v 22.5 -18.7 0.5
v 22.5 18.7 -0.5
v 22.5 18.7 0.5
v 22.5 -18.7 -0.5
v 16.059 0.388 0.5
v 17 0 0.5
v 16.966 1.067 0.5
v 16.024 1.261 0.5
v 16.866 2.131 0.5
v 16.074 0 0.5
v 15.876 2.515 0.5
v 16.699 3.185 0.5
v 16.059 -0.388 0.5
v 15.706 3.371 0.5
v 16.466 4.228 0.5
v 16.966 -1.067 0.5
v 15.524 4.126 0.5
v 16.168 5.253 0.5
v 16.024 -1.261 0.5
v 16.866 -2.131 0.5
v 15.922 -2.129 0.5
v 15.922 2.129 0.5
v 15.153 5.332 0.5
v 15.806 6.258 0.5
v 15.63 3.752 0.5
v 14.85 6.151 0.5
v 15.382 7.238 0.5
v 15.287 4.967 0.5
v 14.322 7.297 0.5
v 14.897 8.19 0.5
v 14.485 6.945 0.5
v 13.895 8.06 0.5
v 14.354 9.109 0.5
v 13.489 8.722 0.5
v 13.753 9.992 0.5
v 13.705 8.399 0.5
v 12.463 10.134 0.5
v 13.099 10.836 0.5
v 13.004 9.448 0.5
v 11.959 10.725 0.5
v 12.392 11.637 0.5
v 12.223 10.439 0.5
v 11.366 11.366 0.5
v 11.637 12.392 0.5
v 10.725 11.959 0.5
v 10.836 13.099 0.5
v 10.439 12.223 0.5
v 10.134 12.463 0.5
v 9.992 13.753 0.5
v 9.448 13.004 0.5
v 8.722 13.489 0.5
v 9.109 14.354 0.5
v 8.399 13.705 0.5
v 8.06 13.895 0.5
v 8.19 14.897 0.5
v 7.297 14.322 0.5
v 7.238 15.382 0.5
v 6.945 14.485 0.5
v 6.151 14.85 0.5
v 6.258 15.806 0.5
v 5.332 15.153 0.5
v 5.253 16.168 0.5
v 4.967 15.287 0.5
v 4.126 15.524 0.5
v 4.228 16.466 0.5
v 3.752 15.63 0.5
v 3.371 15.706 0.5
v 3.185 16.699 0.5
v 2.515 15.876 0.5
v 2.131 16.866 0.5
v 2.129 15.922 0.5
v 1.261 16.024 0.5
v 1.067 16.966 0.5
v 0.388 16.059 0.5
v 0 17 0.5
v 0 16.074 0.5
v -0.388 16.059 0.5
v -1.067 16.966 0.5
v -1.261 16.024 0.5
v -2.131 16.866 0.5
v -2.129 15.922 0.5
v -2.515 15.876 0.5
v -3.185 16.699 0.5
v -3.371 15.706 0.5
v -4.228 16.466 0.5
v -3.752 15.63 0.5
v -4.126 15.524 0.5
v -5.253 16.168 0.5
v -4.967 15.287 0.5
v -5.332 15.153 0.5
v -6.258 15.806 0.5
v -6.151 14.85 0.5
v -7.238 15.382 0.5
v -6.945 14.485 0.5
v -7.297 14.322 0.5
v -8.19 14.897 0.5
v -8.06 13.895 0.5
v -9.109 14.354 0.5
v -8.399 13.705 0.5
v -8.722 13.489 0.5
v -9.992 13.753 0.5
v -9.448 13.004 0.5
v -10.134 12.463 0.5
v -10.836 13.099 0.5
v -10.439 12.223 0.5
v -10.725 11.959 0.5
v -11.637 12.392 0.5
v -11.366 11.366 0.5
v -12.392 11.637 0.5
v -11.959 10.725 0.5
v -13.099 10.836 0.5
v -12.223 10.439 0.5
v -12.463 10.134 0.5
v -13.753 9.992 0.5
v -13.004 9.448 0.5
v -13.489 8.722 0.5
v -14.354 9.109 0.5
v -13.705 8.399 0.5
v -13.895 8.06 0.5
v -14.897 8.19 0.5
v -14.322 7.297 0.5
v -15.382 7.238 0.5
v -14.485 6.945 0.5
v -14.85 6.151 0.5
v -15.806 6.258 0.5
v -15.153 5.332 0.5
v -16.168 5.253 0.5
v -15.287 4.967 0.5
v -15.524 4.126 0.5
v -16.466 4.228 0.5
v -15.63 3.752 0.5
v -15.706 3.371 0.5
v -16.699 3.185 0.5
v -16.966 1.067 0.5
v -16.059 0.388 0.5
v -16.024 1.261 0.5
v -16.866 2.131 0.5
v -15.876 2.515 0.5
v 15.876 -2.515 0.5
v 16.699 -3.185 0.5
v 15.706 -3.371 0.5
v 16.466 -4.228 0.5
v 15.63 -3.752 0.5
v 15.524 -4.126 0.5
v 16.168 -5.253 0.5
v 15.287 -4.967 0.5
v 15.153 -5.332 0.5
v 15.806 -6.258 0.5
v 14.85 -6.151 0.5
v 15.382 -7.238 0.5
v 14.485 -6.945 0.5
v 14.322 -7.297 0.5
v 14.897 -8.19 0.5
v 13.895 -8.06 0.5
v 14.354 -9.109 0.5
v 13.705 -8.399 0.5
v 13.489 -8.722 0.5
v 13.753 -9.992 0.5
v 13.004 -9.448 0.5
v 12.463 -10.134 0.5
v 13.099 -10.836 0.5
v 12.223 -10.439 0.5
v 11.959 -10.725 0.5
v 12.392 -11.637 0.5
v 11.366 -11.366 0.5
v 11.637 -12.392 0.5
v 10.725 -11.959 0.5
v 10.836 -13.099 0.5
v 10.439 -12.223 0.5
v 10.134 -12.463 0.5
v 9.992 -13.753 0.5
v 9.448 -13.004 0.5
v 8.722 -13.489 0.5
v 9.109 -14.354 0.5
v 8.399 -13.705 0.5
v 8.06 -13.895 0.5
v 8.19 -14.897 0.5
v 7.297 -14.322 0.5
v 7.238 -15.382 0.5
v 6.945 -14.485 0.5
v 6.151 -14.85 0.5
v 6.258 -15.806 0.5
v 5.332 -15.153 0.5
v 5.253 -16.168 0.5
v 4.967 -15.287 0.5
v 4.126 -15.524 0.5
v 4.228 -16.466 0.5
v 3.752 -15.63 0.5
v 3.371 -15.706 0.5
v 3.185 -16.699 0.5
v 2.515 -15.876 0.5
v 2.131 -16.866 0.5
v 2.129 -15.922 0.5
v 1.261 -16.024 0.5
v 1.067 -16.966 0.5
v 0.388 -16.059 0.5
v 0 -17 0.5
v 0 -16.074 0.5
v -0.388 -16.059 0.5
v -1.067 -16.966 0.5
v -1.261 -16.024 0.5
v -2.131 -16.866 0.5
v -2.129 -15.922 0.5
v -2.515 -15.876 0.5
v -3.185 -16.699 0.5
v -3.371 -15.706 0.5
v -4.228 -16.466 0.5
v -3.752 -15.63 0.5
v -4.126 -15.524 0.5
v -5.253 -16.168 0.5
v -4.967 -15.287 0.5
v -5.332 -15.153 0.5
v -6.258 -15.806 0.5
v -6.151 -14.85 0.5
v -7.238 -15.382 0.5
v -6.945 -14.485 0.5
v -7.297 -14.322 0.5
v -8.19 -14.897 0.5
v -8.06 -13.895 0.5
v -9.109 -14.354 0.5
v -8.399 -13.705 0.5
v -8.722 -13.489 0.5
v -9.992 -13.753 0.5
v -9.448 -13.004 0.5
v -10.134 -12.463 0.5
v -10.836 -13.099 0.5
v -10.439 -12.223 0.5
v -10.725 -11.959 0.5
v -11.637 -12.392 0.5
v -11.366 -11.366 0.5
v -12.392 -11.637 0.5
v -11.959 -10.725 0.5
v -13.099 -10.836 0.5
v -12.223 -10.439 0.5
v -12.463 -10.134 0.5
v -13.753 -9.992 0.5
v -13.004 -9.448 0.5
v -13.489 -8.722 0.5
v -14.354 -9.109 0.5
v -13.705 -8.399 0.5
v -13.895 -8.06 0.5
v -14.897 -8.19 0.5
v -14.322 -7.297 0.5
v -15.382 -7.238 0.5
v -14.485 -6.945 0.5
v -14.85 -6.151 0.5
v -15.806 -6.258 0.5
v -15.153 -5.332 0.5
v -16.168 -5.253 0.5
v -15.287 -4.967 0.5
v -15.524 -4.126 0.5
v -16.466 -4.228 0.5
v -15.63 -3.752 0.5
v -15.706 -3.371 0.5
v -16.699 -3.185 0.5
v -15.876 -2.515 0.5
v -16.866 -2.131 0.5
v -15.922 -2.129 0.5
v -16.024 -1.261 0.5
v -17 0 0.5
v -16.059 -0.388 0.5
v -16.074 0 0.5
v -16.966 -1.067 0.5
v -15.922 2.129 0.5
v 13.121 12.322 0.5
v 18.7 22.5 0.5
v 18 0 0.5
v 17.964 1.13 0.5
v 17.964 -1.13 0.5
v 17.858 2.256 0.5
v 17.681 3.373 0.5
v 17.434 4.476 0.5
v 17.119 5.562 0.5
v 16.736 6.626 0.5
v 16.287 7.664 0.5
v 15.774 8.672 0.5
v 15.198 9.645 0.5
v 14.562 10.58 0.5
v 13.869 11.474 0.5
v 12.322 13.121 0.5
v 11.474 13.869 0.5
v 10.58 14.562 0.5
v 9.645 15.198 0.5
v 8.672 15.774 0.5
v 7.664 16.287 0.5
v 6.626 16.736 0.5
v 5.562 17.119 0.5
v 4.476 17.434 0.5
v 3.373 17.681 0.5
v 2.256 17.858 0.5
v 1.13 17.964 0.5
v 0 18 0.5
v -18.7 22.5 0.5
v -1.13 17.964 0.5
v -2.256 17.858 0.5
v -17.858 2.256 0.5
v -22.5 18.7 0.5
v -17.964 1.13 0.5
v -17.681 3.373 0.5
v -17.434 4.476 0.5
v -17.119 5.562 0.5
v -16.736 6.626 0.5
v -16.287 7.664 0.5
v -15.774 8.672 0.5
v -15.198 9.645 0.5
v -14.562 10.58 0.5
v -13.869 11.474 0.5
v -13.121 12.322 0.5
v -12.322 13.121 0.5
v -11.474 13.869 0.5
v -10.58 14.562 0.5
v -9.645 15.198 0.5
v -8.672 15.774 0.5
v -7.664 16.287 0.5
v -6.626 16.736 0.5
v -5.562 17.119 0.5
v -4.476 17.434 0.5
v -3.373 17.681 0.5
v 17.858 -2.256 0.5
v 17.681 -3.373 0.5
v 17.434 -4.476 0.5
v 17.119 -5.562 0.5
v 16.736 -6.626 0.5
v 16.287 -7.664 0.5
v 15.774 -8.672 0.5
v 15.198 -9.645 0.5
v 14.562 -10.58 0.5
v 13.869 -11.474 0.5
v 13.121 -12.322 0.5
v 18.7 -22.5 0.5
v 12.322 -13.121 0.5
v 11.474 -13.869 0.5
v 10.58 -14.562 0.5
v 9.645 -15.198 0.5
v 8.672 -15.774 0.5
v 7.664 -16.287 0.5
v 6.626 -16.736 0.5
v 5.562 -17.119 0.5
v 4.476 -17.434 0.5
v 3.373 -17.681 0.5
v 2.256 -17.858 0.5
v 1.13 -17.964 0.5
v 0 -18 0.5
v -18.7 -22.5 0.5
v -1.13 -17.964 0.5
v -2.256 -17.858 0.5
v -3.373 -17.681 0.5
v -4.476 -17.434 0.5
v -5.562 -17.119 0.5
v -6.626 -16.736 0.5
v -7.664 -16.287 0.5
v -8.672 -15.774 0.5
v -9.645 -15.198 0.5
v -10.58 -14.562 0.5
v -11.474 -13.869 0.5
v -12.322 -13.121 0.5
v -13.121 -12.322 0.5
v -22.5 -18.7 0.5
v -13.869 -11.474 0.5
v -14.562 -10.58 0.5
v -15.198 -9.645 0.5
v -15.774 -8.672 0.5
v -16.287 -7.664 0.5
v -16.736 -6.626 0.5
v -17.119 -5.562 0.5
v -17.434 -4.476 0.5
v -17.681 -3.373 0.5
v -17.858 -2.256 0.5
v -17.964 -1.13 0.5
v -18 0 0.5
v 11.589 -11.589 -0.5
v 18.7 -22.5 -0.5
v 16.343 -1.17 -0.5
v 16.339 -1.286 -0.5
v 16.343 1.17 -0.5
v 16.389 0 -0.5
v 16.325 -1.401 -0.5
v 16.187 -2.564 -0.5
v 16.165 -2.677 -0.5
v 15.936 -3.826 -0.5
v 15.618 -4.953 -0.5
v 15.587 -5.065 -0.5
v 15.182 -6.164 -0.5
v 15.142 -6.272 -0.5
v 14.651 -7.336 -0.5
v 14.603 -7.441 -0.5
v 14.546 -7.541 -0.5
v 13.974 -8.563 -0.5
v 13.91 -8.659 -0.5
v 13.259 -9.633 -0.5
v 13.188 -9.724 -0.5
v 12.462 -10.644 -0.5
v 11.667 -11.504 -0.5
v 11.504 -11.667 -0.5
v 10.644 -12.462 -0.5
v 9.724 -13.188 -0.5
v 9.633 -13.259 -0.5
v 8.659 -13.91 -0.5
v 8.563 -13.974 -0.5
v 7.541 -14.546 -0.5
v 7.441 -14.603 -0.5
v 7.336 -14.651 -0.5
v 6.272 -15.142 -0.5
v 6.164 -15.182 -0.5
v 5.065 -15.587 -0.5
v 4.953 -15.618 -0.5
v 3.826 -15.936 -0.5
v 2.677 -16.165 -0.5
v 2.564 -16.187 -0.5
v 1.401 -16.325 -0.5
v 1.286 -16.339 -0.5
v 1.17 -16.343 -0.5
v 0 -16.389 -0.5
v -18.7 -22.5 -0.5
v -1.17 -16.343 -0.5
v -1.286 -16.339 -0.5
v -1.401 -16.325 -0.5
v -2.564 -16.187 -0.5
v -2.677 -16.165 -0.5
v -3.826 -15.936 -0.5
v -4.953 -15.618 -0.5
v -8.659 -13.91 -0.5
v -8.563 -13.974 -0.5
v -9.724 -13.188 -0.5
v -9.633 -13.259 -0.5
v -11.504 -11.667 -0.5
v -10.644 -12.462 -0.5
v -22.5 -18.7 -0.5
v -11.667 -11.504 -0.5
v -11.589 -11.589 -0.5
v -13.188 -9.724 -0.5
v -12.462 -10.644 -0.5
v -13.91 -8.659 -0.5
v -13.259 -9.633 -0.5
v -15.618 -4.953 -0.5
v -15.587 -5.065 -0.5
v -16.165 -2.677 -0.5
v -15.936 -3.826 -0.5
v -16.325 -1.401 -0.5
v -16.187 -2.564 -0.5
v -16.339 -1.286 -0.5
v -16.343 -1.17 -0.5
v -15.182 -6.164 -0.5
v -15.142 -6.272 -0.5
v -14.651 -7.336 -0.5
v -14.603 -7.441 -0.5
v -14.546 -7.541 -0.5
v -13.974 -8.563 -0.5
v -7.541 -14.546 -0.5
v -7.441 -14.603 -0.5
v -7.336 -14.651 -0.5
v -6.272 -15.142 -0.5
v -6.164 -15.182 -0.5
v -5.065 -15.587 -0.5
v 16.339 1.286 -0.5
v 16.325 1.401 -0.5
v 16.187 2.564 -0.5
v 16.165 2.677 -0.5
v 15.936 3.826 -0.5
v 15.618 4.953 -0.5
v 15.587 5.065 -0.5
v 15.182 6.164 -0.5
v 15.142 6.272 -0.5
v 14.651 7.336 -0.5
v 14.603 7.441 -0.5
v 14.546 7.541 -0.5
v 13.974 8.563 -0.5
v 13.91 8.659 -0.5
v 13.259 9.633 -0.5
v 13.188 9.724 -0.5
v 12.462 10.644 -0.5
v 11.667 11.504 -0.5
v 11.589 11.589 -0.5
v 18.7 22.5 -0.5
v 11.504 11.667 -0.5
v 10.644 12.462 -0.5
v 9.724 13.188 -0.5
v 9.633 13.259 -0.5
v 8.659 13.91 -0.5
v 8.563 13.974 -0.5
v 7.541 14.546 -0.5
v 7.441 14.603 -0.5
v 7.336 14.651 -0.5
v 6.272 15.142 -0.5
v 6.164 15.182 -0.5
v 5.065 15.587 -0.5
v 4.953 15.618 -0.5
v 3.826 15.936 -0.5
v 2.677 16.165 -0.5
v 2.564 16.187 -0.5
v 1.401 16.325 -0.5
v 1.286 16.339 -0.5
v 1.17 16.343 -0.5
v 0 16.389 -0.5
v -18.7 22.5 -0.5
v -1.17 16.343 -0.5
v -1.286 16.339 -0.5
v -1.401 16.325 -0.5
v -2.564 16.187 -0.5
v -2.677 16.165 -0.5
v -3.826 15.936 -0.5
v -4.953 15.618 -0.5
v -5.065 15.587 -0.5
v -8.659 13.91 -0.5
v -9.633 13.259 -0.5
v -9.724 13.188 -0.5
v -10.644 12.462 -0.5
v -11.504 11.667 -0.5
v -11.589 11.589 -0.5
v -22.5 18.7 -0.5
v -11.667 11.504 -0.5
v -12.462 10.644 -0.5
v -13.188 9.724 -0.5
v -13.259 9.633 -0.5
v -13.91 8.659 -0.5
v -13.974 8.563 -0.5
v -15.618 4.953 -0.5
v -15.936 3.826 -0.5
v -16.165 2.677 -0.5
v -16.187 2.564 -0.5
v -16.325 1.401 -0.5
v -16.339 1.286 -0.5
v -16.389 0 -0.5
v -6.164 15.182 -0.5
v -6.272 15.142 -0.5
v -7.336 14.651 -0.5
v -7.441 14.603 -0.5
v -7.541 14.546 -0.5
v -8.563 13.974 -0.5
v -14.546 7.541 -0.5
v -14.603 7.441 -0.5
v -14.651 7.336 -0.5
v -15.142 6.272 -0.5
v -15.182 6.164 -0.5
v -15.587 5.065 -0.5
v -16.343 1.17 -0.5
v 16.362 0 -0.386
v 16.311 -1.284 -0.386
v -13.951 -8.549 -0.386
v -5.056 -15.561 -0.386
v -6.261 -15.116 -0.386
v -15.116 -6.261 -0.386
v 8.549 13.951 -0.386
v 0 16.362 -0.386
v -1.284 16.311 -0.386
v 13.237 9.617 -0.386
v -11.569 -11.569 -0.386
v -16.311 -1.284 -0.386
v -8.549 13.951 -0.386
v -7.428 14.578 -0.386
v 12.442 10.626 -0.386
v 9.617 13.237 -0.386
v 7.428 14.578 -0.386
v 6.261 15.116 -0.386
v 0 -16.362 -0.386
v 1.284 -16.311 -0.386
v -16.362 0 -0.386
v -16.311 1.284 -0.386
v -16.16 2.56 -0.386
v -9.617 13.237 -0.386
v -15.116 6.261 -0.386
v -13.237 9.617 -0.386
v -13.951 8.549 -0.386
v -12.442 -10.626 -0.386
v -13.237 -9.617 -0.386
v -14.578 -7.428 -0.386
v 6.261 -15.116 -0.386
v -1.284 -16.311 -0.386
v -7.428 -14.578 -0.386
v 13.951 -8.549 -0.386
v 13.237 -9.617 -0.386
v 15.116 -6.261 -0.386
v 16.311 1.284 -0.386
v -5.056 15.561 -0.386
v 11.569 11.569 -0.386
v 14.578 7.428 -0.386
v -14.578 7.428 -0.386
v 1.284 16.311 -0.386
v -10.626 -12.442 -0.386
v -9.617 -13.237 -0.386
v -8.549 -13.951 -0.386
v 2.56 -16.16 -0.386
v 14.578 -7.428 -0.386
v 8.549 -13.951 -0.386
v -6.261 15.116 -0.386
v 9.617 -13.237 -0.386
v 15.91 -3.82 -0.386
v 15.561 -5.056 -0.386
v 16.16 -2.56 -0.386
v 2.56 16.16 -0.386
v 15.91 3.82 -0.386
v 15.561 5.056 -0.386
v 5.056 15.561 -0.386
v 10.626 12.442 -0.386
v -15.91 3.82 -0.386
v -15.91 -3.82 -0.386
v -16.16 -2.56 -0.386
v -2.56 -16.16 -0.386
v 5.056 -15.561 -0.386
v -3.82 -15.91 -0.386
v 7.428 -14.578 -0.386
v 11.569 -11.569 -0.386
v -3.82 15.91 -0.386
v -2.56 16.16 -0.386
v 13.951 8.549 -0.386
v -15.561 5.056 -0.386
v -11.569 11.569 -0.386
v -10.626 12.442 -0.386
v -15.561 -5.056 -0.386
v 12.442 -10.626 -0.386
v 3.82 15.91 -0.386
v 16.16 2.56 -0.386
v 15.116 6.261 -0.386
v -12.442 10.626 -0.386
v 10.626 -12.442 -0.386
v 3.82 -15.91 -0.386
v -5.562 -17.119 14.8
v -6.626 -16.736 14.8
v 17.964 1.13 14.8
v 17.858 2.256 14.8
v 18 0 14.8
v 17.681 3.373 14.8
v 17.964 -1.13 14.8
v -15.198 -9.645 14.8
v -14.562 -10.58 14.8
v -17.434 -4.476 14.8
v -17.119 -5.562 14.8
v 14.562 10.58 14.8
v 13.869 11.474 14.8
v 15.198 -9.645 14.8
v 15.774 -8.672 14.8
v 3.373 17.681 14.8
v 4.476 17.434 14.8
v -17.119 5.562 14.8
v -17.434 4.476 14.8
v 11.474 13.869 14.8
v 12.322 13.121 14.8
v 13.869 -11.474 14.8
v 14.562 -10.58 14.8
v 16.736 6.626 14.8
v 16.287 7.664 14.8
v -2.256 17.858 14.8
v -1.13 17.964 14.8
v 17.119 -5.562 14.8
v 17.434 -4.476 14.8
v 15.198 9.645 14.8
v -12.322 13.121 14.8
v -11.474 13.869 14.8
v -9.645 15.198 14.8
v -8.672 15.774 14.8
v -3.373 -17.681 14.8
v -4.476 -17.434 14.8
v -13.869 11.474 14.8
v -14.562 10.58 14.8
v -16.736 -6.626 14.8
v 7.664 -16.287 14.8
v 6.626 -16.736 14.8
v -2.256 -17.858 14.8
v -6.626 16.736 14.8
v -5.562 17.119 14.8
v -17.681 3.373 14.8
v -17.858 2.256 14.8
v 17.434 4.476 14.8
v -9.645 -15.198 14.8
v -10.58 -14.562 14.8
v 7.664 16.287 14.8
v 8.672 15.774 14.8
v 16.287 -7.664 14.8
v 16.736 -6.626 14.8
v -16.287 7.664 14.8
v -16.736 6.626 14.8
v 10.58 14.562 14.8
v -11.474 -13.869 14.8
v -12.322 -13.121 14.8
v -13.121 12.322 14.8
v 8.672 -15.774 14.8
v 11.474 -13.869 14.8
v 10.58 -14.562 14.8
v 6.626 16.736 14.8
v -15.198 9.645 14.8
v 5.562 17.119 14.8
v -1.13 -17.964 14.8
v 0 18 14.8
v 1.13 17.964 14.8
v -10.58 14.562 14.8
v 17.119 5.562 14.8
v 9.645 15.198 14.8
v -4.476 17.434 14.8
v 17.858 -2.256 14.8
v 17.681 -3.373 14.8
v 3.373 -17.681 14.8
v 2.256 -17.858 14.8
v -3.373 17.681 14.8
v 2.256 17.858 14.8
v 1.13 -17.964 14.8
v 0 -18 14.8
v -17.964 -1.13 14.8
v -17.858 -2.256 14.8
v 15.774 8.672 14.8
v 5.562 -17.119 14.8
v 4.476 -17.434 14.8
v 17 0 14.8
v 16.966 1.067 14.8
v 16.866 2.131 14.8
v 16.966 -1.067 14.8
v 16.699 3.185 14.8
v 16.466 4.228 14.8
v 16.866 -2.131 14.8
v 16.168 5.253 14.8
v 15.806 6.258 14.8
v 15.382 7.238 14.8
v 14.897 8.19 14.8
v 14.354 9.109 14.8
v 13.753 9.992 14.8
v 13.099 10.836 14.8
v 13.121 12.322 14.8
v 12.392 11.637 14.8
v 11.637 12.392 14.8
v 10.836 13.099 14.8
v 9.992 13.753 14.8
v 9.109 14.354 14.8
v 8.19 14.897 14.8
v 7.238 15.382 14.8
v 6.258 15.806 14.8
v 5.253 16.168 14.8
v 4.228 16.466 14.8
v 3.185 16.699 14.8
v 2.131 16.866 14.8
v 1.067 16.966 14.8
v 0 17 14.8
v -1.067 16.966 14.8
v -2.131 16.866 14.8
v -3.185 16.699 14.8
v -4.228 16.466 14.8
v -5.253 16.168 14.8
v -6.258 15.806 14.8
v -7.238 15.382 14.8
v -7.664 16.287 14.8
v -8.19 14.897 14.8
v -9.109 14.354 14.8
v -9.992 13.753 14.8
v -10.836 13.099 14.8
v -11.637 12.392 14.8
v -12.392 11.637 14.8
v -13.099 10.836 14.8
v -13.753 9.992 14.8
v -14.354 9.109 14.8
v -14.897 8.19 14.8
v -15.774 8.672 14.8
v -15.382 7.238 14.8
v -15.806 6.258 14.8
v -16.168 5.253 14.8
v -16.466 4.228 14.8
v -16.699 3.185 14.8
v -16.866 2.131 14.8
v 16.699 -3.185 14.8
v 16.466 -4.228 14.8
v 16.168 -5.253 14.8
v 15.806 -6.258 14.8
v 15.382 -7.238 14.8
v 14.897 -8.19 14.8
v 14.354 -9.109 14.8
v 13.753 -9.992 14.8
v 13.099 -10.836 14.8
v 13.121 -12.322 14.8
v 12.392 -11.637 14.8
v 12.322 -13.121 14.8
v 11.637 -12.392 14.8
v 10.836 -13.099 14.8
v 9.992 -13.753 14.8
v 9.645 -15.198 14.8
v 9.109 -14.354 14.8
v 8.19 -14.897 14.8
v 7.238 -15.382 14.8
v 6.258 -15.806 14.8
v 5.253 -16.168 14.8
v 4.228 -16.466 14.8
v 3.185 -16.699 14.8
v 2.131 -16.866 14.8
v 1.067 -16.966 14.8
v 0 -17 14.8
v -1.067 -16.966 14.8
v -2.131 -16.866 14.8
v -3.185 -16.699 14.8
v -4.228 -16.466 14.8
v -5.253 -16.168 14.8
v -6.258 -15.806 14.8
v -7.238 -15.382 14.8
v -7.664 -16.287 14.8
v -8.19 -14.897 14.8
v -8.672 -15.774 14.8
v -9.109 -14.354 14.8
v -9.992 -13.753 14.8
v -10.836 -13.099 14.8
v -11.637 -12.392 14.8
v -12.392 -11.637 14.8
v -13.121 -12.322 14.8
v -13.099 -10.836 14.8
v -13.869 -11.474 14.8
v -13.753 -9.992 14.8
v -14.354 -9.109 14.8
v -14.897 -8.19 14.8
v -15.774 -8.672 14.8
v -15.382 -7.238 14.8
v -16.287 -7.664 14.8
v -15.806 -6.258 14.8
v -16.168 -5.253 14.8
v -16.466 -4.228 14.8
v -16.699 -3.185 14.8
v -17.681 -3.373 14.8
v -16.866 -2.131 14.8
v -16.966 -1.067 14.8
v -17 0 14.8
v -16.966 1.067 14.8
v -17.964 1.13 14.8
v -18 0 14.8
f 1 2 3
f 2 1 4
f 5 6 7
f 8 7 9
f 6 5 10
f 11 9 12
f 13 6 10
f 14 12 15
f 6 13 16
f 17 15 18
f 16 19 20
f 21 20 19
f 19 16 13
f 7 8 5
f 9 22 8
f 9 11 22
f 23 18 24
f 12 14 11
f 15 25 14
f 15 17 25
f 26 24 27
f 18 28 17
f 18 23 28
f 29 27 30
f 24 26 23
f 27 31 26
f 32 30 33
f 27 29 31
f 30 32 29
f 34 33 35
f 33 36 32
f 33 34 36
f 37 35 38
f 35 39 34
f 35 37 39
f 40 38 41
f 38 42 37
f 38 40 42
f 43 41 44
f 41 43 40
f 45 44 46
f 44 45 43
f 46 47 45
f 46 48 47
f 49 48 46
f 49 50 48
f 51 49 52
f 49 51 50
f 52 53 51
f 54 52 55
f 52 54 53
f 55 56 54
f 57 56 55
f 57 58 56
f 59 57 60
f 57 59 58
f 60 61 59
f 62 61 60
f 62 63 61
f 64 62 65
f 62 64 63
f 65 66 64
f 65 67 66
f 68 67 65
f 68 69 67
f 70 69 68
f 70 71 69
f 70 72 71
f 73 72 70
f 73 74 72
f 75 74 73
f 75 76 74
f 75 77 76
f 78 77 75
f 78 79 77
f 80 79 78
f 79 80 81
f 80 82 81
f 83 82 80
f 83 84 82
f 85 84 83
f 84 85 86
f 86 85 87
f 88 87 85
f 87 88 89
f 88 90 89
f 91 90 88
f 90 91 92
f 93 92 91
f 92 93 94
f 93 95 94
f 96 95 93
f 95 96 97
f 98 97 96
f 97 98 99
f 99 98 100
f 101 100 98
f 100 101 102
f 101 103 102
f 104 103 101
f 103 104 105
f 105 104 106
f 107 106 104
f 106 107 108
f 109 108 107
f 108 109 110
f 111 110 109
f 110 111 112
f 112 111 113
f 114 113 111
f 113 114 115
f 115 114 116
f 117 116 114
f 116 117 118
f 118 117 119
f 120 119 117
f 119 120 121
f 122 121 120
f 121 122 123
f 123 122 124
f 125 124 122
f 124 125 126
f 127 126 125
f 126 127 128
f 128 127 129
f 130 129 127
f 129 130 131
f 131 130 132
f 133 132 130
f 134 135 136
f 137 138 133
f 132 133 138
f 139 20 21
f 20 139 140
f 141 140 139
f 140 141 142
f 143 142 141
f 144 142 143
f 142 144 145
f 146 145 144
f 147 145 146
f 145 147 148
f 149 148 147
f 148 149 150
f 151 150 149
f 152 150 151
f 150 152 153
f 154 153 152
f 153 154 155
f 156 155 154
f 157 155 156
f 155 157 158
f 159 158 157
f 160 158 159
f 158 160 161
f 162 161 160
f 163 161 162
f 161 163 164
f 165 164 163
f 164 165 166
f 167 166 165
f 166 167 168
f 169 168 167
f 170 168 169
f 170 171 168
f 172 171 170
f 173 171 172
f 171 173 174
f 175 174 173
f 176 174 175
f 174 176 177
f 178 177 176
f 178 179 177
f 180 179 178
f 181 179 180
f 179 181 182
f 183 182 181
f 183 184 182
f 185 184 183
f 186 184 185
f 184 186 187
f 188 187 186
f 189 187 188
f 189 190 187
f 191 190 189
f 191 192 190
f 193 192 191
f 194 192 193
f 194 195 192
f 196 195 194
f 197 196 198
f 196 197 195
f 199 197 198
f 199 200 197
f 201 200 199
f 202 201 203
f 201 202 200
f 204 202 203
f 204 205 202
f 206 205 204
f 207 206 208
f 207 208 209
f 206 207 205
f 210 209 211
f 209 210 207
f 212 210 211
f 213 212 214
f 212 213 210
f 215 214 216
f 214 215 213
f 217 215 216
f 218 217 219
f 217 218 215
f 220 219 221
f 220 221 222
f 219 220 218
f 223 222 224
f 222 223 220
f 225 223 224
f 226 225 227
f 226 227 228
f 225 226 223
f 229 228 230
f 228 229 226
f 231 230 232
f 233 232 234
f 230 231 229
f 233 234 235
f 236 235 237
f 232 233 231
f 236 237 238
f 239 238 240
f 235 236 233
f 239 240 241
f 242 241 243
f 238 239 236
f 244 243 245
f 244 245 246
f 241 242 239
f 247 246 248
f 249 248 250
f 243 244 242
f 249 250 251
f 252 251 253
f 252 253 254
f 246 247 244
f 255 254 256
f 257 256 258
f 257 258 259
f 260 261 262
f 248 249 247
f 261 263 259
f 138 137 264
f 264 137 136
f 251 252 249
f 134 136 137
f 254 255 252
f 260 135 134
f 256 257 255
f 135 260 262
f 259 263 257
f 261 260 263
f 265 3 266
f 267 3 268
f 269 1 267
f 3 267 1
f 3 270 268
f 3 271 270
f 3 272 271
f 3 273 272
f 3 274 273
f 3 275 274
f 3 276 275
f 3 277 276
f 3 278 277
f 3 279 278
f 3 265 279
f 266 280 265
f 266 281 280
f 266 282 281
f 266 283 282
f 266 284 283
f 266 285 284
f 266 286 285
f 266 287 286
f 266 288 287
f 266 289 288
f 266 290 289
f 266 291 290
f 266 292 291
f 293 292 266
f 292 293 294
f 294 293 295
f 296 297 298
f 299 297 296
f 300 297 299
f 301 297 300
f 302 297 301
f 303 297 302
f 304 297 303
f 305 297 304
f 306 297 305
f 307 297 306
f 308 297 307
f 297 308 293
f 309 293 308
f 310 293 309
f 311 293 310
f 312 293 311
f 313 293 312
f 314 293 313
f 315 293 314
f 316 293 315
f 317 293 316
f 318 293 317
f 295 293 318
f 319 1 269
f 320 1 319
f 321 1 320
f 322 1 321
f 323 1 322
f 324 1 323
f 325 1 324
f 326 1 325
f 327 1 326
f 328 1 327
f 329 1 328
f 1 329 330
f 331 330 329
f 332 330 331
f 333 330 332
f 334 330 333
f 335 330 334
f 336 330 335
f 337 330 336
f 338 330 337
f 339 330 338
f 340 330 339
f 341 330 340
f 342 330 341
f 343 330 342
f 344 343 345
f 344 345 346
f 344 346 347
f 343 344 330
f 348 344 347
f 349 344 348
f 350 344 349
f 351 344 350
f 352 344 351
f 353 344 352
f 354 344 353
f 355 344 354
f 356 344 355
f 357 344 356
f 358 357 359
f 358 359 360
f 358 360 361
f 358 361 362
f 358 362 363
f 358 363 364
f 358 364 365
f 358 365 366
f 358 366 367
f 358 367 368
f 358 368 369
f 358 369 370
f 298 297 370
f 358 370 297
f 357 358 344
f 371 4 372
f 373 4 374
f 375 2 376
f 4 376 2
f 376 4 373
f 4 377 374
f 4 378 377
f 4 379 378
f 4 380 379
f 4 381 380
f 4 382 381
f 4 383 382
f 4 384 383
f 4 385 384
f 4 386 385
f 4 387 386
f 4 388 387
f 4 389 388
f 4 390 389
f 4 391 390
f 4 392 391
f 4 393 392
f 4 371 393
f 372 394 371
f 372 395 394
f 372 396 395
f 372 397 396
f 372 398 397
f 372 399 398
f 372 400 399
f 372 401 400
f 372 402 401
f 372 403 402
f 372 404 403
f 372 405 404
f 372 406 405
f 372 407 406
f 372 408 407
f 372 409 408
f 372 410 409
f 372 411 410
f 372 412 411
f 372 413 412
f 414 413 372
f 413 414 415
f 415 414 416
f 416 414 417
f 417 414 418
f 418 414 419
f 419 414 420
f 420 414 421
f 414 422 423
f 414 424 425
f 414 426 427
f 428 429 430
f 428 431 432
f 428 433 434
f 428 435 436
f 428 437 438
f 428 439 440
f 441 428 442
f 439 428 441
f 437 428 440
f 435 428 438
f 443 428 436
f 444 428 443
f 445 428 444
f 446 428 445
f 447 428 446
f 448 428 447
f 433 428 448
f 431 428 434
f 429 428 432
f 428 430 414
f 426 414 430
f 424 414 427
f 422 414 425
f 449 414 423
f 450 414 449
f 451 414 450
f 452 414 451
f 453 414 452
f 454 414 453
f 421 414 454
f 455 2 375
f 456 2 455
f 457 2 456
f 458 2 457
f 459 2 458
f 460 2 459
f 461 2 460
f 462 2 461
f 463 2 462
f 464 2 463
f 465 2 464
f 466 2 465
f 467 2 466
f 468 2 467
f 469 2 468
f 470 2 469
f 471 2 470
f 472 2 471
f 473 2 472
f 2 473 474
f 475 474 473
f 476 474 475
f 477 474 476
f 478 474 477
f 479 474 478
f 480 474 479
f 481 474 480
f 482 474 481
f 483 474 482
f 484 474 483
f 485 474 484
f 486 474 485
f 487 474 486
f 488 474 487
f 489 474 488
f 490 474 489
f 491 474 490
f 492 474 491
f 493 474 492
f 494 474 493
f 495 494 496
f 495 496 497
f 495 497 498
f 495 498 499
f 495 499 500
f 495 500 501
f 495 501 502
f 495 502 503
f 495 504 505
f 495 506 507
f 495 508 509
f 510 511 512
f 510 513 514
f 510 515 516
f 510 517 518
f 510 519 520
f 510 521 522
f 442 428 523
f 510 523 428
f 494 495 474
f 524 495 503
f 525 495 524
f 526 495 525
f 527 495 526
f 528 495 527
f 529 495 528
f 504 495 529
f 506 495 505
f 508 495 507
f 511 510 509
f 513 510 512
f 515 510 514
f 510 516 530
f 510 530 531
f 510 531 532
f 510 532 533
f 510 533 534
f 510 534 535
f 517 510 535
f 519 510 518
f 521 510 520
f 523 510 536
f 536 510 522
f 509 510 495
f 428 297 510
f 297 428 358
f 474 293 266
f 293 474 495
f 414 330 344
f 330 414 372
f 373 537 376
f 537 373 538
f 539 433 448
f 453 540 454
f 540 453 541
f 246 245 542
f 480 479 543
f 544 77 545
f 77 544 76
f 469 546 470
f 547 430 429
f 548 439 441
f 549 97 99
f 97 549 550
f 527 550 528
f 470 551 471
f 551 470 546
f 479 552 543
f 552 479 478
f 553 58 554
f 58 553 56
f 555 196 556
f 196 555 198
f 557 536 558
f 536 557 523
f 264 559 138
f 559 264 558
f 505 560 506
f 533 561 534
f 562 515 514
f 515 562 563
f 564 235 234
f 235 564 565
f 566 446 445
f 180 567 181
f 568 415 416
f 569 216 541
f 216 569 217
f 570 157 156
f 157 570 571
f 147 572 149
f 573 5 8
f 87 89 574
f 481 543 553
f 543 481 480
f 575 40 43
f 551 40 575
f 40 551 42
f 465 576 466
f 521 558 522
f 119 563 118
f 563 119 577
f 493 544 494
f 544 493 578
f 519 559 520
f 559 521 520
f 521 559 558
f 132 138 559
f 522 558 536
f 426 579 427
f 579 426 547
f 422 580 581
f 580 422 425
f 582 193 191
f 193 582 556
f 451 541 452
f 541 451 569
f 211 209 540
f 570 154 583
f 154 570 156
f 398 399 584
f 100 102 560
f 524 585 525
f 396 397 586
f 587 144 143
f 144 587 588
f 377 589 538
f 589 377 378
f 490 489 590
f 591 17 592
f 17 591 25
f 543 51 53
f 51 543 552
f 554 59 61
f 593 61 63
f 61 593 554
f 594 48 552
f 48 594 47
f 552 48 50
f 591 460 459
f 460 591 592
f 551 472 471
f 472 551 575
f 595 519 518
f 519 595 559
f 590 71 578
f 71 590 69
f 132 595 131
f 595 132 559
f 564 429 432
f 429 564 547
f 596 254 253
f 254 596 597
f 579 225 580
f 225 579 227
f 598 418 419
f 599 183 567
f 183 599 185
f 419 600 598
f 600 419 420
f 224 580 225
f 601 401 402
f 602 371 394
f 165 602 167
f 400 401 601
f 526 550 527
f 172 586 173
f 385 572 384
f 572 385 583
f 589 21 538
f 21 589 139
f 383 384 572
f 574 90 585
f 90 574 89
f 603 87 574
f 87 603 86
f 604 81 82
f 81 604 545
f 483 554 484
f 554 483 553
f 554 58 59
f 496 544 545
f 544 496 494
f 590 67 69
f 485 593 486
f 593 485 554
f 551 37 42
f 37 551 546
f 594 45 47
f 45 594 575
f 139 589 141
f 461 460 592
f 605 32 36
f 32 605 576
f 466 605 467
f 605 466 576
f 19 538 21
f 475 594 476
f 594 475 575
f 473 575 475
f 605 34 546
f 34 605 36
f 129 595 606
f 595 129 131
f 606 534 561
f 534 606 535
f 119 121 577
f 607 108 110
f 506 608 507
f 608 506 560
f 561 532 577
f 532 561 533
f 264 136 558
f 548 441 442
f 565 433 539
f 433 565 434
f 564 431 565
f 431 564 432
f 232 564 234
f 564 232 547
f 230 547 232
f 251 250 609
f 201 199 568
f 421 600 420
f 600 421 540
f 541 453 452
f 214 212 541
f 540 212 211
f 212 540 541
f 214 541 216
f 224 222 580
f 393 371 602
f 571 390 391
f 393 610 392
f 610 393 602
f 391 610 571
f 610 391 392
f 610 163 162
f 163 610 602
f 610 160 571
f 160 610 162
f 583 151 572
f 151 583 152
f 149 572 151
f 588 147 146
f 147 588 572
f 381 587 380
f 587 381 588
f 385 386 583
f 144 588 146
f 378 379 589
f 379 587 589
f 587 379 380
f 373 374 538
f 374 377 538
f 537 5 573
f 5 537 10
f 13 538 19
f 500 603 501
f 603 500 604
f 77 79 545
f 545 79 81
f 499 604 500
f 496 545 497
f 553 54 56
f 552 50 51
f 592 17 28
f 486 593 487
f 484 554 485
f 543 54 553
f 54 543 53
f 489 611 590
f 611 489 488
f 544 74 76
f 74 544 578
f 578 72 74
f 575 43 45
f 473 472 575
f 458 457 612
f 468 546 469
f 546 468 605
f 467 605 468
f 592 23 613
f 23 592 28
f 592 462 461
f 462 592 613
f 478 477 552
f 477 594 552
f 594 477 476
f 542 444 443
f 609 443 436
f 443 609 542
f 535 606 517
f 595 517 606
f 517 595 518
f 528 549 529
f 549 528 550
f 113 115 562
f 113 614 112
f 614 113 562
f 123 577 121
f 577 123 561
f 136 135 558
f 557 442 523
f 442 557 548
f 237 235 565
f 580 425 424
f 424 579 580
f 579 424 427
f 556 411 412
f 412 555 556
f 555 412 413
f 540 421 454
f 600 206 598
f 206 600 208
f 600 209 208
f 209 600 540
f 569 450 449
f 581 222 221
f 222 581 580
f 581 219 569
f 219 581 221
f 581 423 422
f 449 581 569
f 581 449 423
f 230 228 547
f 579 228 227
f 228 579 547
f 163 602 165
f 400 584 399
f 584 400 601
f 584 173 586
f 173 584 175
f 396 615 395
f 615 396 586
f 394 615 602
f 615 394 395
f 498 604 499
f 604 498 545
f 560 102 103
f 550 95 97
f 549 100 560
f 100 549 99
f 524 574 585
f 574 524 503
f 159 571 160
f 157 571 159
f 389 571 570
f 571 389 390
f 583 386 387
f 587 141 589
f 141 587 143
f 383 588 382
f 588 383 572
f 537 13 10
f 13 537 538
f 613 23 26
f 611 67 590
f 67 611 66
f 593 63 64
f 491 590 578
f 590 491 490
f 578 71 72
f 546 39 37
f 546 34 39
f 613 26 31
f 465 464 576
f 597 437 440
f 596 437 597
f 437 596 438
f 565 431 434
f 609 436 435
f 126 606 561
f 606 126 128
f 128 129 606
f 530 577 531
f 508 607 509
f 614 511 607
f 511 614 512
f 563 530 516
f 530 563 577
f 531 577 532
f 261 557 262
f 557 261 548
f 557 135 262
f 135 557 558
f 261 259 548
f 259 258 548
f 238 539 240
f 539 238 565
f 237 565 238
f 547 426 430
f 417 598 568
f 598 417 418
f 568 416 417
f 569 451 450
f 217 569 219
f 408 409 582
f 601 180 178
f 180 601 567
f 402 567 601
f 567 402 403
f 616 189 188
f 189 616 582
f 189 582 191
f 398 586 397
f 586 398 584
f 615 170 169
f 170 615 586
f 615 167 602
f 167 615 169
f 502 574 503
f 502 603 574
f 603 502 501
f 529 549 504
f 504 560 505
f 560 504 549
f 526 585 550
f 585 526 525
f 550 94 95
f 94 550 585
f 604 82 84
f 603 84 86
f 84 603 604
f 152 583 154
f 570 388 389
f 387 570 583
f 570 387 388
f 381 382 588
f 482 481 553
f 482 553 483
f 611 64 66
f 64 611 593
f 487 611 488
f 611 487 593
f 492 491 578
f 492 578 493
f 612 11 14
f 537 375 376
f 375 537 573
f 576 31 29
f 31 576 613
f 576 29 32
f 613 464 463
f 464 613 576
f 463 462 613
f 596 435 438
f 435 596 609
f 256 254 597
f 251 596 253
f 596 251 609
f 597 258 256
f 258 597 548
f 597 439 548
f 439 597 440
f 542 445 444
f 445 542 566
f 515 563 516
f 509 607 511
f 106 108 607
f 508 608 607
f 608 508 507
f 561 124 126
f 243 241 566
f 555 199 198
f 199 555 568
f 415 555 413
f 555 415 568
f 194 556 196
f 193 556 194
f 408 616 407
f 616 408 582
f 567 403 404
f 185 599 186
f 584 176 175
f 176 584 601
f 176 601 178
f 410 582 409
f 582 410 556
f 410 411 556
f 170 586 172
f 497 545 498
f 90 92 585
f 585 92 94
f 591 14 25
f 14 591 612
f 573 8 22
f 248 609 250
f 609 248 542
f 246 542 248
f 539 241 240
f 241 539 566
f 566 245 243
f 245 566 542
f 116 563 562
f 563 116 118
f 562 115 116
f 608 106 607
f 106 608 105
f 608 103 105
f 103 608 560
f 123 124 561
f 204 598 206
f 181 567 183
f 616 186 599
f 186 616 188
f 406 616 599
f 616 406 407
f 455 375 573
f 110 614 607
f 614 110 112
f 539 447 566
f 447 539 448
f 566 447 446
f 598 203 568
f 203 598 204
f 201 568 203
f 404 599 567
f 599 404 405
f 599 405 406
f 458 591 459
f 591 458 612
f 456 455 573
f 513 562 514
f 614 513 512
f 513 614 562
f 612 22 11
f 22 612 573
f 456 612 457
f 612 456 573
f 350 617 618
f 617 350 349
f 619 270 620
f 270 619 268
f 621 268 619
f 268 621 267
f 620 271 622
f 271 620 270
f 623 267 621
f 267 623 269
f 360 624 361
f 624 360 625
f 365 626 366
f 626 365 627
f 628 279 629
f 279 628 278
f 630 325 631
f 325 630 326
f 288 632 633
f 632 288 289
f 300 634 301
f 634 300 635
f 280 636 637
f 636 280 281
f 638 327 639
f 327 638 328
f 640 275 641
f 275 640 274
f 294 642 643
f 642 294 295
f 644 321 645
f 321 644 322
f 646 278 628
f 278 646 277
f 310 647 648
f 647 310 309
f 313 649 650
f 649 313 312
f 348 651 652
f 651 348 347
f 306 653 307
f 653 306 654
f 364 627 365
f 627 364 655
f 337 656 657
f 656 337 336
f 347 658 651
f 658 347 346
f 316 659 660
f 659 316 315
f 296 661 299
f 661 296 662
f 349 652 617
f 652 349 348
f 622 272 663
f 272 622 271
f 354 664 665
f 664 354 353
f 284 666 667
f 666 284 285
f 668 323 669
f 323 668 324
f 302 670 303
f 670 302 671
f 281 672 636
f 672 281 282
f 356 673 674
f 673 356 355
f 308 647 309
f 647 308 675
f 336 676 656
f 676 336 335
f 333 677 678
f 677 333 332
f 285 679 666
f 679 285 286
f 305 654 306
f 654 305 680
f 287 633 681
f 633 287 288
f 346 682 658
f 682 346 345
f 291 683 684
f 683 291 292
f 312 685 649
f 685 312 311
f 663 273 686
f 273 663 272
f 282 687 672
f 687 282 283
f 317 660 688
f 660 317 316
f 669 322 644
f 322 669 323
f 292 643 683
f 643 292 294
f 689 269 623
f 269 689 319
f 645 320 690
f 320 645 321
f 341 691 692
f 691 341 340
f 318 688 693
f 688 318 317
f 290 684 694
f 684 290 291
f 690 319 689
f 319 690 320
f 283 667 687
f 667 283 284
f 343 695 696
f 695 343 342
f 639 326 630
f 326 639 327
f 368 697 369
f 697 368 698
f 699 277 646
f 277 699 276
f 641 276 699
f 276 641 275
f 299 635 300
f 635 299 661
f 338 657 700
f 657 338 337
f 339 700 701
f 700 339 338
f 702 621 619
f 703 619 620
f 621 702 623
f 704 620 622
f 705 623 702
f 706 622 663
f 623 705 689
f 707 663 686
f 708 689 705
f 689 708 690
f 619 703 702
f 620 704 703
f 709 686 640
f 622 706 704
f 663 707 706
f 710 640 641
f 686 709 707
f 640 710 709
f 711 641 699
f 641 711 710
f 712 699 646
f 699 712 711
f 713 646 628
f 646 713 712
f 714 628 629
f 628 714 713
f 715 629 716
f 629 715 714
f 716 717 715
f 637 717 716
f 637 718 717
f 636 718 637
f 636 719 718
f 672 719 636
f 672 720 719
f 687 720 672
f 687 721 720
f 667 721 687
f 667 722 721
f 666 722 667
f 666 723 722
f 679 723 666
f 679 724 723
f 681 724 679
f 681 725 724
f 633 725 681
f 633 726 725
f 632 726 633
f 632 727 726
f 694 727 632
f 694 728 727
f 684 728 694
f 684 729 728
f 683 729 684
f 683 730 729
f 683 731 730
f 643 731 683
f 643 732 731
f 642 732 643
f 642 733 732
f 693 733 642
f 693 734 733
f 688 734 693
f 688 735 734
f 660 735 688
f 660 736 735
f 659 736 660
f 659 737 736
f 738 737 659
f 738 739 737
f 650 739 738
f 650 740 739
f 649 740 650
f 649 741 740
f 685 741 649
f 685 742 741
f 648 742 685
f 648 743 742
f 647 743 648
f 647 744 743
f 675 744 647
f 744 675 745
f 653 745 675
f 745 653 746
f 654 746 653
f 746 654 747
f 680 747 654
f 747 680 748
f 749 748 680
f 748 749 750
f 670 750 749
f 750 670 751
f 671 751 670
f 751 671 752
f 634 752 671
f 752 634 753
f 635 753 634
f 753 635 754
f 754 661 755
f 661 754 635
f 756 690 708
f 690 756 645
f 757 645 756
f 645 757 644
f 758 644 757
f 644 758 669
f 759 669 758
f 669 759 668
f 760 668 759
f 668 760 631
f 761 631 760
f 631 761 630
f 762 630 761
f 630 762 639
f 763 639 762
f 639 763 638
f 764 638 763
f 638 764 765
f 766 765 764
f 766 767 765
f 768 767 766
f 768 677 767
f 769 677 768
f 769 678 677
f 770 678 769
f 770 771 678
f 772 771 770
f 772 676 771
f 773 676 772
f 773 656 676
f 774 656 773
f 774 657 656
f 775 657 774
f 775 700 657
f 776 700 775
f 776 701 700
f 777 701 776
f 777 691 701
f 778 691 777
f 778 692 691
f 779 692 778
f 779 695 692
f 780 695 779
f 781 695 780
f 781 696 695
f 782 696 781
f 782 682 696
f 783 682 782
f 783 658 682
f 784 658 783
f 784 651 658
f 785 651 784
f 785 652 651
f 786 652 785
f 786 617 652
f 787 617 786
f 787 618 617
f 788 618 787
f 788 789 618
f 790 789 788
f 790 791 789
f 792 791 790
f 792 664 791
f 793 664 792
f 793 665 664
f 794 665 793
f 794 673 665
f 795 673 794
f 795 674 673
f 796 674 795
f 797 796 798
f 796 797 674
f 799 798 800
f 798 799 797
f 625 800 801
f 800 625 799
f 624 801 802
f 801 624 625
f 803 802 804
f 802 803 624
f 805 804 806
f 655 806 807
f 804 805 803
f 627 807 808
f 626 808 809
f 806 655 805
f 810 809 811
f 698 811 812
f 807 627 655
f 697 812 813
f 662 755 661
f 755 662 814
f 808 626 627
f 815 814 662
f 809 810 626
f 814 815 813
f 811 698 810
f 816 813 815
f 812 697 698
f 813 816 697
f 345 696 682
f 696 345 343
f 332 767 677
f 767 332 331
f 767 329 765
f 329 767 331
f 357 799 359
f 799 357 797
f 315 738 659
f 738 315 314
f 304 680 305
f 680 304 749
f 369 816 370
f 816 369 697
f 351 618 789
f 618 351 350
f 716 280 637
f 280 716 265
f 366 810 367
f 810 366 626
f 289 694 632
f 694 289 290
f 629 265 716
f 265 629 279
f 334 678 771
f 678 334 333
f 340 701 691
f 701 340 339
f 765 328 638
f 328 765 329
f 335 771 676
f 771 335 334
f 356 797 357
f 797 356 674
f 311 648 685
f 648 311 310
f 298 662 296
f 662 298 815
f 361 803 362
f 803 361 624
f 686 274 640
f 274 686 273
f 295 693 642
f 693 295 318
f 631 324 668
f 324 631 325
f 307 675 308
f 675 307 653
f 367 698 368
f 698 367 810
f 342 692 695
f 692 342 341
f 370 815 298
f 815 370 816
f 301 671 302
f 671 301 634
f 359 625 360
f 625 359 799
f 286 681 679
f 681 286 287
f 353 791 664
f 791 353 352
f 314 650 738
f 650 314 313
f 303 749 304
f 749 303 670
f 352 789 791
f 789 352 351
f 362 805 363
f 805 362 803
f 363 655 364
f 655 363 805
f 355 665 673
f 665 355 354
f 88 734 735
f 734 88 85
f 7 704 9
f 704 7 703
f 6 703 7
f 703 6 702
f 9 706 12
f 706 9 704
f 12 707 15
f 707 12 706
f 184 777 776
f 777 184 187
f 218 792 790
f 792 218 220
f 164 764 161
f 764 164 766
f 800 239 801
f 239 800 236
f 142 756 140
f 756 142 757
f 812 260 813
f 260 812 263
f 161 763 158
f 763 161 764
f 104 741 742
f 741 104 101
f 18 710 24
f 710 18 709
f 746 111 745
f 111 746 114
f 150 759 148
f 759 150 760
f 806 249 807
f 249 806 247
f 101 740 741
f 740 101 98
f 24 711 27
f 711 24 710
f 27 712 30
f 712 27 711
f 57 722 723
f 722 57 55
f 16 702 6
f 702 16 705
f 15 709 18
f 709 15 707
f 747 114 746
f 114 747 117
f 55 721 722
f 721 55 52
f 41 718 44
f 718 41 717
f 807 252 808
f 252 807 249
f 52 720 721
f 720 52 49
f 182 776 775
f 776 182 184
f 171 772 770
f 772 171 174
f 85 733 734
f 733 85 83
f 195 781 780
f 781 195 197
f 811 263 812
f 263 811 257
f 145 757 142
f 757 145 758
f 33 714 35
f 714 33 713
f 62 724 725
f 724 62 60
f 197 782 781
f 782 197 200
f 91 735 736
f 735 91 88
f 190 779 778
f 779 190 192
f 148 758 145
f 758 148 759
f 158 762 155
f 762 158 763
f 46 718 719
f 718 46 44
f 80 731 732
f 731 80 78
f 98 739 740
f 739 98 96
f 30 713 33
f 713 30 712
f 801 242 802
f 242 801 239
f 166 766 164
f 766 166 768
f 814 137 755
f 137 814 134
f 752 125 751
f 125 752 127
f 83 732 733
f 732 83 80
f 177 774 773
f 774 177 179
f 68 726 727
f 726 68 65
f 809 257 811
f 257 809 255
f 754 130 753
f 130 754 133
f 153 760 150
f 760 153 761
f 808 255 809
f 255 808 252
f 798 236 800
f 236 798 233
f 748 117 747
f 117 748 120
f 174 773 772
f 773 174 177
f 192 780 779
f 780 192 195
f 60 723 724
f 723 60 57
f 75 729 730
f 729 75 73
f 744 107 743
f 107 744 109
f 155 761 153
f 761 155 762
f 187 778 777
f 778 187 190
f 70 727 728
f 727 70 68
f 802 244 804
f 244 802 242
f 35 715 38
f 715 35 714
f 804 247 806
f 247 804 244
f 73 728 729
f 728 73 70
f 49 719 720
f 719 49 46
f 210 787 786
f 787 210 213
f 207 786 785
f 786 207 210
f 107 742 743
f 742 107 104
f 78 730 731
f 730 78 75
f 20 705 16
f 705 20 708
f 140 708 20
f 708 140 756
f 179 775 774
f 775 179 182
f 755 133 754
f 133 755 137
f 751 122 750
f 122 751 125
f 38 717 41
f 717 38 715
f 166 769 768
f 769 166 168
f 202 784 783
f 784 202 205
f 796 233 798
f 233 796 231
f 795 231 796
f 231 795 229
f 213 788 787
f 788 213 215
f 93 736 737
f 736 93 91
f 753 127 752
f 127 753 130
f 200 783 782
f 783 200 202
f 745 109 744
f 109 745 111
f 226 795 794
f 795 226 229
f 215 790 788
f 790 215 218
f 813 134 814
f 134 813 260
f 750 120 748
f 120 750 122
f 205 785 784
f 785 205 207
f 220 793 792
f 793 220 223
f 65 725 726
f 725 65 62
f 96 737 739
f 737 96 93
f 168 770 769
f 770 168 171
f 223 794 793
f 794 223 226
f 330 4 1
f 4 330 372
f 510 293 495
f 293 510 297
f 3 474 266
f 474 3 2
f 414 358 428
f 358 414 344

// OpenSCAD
/*
Enclosure for BlinkM RGB led by crox
http://www.thingiverse.com/thing:8159
*/

// comment out one at a time :o)
top();
//plate();
//box();
//back();



module top() {
  difference() {
    union() {
      difference() {
        cube(size = [45, 45, 1], center = true);
        translate(v = [0, 0, -5]) sphere(r = 17, $fn=80);
      }
      difference() {
         translate(v = [0, 0, -0.2]) cylinder(r = 18, h = 15, $fn=100);
        translate(v = [0, 0, -2]) cylinder(r = 17, h = 20, $fn=100);
      }
    }
    translate(v = [0, 0, -2]) corners();
  }
}

module plate() {
  difference() {
    cube(size = [45, 45, 1], center = true);
    translate(v = [0, -4, 0]) cube(size = [11, 16, 3], center = true);
    translate(v = [0, 0, -2]) corners();
  }
}

module box() {
  difference() {
    cube(size = [48, 48, 1], center = true);
    translate(v = [0, 0, -5]) cylinder(r = 19, h = 10, $fn=100);
  }
  translate(v = [0, 0, 6.5]) difference() {
    cube(size = [48, 48, 12], center = true);
    cube(size = [46, 46, 12], center = true);
  }
  corners();
}

module corner() {
  difference() {
    cube(size = [5, 5, 10], center=true);
    translate(v = [-3, -3, -10]) rotate(a=[0,0,45]) cube(size = [8, 8, 20]);
  }
}

module corners() {
  translate(v = [20.6, -20.6, 4.8]) corner();
  translate(v = [-20.6, 20.6, 4.8]) rotate(a=[0,0,180]) corner();
  translate(v = [20.6, 20.6, 4.8]) rotate(a=[0,0,90]) corner();
  translate(v = [-20.6, -20.6, 4.8]) rotate(a=[0,0,-90]) corner();
}

module back() {
  difference() {
    cube(size = [44, 44, 1], center = true);
    translate(v = [0, -10.7, 0]) cube(size = [18, 4, 10], center = true);
    translate(v = [0, 0, -5]) scale(v = [1.04, 1.04, 1.04]) corners();
  }
  translate(v = [0, -22.5, 13.5]) cube(size = [30, 1, 20], center = true);
  difference() {
    translate(v = [0, -21.95, 2.5]) rotate(a=[27,0,0]) cube(size = [30, 1, 3], center = true);
    translate(v = [0, -23.5, 0]) cube(size = [30, 1, 20], center = true);
    translate(v = [0, -20.5, 0]) cube(size = [30, 1, 5], center = true);
  }
  translate(v = [14.5, 0, 0]) support();
  translate(v = [-14.5, 0, 0]) support();
  translate(v = [0, -21.5, 1]) cube(size = [30, 1, 1], center = true);
}

module support() {
  translate(v = [0, -17, 5.4]) {
    difference() {
      cube(size = [1, 10, 10], center = true);
      translate(v = [0, 5, 5]) rotate(a=[45,0,0]) cube(size = [2, 15, 15], center = true);
    }
  }
}
